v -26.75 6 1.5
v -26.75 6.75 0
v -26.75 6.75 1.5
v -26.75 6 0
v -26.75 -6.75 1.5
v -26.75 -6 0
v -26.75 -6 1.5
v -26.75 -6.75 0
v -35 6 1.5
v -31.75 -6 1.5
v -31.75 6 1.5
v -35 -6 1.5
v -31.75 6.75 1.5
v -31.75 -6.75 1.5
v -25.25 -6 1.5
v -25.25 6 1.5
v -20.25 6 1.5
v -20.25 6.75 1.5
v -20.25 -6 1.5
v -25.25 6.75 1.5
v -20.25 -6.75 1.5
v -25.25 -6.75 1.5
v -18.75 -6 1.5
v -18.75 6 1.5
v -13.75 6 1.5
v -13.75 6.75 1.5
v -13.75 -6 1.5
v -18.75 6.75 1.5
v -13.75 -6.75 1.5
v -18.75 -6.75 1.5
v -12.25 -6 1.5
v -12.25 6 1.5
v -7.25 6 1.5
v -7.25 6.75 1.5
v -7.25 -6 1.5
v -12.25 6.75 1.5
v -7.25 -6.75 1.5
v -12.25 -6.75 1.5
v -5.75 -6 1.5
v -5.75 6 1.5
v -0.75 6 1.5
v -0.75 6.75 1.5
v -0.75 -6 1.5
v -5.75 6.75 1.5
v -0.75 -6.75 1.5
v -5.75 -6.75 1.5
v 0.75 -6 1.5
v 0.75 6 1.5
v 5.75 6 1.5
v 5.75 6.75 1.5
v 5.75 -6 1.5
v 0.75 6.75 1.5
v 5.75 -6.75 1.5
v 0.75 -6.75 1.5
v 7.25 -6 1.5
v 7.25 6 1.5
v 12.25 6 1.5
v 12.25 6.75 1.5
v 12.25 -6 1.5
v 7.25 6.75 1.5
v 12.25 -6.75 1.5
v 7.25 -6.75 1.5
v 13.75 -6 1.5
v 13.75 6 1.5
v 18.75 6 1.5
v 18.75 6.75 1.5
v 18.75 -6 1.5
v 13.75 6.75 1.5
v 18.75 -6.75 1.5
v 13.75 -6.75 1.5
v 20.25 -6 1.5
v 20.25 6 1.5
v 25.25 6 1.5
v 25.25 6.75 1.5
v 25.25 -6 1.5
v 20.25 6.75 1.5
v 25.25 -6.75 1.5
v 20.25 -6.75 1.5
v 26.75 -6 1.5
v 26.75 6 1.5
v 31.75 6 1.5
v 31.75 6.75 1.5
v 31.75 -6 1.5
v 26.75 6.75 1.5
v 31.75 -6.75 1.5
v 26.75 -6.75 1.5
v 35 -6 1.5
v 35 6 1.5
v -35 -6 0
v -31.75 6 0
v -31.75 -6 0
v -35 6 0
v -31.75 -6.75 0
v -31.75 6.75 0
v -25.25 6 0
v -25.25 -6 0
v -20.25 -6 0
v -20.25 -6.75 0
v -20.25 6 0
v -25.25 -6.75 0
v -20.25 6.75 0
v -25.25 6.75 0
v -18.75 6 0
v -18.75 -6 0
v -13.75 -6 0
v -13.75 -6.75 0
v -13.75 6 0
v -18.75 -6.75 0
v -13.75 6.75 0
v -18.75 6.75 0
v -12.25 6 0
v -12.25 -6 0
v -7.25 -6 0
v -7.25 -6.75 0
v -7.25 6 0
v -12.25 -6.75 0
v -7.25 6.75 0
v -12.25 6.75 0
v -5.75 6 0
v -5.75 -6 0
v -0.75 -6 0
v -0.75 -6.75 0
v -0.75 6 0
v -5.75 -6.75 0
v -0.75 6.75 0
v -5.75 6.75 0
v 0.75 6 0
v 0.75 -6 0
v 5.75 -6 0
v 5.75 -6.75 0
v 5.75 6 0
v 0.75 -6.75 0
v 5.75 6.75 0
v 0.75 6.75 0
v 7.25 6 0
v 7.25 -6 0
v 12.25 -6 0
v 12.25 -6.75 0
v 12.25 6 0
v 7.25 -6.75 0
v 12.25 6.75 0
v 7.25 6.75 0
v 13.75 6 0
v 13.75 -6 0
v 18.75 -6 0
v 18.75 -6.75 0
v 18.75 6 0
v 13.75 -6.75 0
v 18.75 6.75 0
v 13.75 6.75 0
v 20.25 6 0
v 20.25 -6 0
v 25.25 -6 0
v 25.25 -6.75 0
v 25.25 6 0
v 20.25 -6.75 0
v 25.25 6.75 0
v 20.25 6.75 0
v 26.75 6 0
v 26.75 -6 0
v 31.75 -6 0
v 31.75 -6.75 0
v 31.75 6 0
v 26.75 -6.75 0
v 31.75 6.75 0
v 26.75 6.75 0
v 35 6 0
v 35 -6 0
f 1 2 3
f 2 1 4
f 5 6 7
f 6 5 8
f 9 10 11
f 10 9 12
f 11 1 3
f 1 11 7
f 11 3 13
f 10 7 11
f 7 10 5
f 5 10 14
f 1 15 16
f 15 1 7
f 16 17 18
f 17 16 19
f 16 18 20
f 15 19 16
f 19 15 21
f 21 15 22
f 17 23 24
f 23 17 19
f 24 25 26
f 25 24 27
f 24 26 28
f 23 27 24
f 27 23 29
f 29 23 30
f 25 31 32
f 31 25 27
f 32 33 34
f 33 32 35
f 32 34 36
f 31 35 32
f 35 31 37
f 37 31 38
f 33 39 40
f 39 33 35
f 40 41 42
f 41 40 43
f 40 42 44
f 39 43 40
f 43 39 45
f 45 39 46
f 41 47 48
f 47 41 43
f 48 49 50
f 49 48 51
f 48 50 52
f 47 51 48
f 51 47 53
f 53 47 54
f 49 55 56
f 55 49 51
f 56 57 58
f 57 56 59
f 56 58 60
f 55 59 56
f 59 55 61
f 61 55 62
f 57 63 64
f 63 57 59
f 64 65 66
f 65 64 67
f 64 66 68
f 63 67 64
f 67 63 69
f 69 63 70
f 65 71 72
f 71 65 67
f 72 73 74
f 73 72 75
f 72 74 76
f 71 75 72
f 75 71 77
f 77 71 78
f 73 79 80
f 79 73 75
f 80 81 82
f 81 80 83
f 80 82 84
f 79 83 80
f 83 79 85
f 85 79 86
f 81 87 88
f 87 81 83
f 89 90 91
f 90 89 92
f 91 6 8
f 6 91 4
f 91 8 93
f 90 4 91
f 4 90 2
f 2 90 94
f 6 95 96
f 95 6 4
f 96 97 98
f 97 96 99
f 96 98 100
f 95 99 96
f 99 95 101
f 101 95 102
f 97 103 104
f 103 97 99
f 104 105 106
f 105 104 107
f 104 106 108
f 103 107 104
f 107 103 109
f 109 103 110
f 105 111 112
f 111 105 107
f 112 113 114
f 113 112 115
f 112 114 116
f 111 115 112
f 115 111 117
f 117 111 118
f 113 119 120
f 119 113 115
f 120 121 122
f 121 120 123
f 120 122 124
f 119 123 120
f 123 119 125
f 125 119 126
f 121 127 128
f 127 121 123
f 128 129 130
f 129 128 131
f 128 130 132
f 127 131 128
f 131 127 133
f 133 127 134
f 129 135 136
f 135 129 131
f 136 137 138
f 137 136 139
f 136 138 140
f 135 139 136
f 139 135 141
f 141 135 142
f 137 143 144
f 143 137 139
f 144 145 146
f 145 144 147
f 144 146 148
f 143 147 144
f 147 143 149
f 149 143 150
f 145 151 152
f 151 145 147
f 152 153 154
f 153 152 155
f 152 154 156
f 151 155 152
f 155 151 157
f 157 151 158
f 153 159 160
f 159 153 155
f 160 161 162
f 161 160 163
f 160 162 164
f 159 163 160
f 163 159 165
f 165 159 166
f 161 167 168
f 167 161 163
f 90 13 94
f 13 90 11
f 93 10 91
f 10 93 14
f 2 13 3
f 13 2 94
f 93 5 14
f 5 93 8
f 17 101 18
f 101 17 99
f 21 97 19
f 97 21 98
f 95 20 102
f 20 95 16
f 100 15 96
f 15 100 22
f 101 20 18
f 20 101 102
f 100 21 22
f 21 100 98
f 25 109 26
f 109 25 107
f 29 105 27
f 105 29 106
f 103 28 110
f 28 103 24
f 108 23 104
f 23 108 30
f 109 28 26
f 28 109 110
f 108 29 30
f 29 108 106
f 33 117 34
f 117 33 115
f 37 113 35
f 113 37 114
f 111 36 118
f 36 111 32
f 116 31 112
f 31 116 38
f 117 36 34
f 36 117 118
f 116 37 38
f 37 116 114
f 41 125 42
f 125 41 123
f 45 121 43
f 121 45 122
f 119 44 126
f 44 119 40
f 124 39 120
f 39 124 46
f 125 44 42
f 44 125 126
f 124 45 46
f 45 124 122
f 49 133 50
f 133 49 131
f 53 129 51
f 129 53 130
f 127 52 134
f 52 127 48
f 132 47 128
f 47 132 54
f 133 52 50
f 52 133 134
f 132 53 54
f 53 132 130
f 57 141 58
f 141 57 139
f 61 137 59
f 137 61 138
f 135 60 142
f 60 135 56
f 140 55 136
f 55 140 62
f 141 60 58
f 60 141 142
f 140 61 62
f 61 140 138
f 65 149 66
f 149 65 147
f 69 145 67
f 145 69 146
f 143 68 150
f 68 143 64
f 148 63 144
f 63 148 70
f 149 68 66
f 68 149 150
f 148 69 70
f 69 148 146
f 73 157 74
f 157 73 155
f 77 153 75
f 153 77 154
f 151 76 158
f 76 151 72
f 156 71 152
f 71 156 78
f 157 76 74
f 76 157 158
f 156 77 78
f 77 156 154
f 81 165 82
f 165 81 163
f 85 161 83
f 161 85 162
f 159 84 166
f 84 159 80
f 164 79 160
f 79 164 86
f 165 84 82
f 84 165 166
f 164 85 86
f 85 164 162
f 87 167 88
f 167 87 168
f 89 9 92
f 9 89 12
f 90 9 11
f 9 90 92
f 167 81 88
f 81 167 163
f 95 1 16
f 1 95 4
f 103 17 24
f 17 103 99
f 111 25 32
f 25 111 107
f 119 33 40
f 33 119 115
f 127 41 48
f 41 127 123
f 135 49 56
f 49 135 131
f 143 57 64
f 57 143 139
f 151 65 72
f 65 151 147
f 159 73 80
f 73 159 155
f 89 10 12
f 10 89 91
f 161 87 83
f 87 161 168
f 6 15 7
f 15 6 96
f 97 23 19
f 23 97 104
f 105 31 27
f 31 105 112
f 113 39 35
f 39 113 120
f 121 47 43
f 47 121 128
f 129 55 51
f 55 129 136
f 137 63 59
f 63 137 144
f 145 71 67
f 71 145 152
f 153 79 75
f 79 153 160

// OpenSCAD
// 10-well agarose gel comb, printed lying flat
// Units: mm

// ---- Spine ----
spine_len   = 70;    // spine length (X)
spine_wid   = 12;    // spine width (Y)
plate_thk   = 1.5;   // plate thickness (Z)

// ---- Teeth ----
tooth_count = 10;    // number of teeth
tooth_w     = 5.0;   // tooth width (X)
tooth_l     = 12;    // tooth length (Y)
tooth_gap   = 1.5;   // gap between neighbouring teeth (X)
overhang    = 1.5;   // tooth extension past spine in -Y

// ---- Derived ----
pitch       = tooth_w + tooth_gap;          // centre-to-centre spacing
x_start     = -(tooth_count - 1) * pitch / 2; // first tooth centre
teeth_len   = spine_wid + overhang;         // tooth length along Y

$fn = 64;

union() {
    // Spine (back bar)
    translate([-spine_len / 2, -spine_wid / 2, 0])
        cube([spine_len, spine_wid, plate_thk]);

    // Teeth row, centred on spine in X
    for (i = [0 : tooth_count - 1])
        translate([x_start + i * pitch - tooth_w / 2,
                   -teeth_len / 2,
                   0])
            cube([tooth_w, teeth_len, plate_thk]);
}
